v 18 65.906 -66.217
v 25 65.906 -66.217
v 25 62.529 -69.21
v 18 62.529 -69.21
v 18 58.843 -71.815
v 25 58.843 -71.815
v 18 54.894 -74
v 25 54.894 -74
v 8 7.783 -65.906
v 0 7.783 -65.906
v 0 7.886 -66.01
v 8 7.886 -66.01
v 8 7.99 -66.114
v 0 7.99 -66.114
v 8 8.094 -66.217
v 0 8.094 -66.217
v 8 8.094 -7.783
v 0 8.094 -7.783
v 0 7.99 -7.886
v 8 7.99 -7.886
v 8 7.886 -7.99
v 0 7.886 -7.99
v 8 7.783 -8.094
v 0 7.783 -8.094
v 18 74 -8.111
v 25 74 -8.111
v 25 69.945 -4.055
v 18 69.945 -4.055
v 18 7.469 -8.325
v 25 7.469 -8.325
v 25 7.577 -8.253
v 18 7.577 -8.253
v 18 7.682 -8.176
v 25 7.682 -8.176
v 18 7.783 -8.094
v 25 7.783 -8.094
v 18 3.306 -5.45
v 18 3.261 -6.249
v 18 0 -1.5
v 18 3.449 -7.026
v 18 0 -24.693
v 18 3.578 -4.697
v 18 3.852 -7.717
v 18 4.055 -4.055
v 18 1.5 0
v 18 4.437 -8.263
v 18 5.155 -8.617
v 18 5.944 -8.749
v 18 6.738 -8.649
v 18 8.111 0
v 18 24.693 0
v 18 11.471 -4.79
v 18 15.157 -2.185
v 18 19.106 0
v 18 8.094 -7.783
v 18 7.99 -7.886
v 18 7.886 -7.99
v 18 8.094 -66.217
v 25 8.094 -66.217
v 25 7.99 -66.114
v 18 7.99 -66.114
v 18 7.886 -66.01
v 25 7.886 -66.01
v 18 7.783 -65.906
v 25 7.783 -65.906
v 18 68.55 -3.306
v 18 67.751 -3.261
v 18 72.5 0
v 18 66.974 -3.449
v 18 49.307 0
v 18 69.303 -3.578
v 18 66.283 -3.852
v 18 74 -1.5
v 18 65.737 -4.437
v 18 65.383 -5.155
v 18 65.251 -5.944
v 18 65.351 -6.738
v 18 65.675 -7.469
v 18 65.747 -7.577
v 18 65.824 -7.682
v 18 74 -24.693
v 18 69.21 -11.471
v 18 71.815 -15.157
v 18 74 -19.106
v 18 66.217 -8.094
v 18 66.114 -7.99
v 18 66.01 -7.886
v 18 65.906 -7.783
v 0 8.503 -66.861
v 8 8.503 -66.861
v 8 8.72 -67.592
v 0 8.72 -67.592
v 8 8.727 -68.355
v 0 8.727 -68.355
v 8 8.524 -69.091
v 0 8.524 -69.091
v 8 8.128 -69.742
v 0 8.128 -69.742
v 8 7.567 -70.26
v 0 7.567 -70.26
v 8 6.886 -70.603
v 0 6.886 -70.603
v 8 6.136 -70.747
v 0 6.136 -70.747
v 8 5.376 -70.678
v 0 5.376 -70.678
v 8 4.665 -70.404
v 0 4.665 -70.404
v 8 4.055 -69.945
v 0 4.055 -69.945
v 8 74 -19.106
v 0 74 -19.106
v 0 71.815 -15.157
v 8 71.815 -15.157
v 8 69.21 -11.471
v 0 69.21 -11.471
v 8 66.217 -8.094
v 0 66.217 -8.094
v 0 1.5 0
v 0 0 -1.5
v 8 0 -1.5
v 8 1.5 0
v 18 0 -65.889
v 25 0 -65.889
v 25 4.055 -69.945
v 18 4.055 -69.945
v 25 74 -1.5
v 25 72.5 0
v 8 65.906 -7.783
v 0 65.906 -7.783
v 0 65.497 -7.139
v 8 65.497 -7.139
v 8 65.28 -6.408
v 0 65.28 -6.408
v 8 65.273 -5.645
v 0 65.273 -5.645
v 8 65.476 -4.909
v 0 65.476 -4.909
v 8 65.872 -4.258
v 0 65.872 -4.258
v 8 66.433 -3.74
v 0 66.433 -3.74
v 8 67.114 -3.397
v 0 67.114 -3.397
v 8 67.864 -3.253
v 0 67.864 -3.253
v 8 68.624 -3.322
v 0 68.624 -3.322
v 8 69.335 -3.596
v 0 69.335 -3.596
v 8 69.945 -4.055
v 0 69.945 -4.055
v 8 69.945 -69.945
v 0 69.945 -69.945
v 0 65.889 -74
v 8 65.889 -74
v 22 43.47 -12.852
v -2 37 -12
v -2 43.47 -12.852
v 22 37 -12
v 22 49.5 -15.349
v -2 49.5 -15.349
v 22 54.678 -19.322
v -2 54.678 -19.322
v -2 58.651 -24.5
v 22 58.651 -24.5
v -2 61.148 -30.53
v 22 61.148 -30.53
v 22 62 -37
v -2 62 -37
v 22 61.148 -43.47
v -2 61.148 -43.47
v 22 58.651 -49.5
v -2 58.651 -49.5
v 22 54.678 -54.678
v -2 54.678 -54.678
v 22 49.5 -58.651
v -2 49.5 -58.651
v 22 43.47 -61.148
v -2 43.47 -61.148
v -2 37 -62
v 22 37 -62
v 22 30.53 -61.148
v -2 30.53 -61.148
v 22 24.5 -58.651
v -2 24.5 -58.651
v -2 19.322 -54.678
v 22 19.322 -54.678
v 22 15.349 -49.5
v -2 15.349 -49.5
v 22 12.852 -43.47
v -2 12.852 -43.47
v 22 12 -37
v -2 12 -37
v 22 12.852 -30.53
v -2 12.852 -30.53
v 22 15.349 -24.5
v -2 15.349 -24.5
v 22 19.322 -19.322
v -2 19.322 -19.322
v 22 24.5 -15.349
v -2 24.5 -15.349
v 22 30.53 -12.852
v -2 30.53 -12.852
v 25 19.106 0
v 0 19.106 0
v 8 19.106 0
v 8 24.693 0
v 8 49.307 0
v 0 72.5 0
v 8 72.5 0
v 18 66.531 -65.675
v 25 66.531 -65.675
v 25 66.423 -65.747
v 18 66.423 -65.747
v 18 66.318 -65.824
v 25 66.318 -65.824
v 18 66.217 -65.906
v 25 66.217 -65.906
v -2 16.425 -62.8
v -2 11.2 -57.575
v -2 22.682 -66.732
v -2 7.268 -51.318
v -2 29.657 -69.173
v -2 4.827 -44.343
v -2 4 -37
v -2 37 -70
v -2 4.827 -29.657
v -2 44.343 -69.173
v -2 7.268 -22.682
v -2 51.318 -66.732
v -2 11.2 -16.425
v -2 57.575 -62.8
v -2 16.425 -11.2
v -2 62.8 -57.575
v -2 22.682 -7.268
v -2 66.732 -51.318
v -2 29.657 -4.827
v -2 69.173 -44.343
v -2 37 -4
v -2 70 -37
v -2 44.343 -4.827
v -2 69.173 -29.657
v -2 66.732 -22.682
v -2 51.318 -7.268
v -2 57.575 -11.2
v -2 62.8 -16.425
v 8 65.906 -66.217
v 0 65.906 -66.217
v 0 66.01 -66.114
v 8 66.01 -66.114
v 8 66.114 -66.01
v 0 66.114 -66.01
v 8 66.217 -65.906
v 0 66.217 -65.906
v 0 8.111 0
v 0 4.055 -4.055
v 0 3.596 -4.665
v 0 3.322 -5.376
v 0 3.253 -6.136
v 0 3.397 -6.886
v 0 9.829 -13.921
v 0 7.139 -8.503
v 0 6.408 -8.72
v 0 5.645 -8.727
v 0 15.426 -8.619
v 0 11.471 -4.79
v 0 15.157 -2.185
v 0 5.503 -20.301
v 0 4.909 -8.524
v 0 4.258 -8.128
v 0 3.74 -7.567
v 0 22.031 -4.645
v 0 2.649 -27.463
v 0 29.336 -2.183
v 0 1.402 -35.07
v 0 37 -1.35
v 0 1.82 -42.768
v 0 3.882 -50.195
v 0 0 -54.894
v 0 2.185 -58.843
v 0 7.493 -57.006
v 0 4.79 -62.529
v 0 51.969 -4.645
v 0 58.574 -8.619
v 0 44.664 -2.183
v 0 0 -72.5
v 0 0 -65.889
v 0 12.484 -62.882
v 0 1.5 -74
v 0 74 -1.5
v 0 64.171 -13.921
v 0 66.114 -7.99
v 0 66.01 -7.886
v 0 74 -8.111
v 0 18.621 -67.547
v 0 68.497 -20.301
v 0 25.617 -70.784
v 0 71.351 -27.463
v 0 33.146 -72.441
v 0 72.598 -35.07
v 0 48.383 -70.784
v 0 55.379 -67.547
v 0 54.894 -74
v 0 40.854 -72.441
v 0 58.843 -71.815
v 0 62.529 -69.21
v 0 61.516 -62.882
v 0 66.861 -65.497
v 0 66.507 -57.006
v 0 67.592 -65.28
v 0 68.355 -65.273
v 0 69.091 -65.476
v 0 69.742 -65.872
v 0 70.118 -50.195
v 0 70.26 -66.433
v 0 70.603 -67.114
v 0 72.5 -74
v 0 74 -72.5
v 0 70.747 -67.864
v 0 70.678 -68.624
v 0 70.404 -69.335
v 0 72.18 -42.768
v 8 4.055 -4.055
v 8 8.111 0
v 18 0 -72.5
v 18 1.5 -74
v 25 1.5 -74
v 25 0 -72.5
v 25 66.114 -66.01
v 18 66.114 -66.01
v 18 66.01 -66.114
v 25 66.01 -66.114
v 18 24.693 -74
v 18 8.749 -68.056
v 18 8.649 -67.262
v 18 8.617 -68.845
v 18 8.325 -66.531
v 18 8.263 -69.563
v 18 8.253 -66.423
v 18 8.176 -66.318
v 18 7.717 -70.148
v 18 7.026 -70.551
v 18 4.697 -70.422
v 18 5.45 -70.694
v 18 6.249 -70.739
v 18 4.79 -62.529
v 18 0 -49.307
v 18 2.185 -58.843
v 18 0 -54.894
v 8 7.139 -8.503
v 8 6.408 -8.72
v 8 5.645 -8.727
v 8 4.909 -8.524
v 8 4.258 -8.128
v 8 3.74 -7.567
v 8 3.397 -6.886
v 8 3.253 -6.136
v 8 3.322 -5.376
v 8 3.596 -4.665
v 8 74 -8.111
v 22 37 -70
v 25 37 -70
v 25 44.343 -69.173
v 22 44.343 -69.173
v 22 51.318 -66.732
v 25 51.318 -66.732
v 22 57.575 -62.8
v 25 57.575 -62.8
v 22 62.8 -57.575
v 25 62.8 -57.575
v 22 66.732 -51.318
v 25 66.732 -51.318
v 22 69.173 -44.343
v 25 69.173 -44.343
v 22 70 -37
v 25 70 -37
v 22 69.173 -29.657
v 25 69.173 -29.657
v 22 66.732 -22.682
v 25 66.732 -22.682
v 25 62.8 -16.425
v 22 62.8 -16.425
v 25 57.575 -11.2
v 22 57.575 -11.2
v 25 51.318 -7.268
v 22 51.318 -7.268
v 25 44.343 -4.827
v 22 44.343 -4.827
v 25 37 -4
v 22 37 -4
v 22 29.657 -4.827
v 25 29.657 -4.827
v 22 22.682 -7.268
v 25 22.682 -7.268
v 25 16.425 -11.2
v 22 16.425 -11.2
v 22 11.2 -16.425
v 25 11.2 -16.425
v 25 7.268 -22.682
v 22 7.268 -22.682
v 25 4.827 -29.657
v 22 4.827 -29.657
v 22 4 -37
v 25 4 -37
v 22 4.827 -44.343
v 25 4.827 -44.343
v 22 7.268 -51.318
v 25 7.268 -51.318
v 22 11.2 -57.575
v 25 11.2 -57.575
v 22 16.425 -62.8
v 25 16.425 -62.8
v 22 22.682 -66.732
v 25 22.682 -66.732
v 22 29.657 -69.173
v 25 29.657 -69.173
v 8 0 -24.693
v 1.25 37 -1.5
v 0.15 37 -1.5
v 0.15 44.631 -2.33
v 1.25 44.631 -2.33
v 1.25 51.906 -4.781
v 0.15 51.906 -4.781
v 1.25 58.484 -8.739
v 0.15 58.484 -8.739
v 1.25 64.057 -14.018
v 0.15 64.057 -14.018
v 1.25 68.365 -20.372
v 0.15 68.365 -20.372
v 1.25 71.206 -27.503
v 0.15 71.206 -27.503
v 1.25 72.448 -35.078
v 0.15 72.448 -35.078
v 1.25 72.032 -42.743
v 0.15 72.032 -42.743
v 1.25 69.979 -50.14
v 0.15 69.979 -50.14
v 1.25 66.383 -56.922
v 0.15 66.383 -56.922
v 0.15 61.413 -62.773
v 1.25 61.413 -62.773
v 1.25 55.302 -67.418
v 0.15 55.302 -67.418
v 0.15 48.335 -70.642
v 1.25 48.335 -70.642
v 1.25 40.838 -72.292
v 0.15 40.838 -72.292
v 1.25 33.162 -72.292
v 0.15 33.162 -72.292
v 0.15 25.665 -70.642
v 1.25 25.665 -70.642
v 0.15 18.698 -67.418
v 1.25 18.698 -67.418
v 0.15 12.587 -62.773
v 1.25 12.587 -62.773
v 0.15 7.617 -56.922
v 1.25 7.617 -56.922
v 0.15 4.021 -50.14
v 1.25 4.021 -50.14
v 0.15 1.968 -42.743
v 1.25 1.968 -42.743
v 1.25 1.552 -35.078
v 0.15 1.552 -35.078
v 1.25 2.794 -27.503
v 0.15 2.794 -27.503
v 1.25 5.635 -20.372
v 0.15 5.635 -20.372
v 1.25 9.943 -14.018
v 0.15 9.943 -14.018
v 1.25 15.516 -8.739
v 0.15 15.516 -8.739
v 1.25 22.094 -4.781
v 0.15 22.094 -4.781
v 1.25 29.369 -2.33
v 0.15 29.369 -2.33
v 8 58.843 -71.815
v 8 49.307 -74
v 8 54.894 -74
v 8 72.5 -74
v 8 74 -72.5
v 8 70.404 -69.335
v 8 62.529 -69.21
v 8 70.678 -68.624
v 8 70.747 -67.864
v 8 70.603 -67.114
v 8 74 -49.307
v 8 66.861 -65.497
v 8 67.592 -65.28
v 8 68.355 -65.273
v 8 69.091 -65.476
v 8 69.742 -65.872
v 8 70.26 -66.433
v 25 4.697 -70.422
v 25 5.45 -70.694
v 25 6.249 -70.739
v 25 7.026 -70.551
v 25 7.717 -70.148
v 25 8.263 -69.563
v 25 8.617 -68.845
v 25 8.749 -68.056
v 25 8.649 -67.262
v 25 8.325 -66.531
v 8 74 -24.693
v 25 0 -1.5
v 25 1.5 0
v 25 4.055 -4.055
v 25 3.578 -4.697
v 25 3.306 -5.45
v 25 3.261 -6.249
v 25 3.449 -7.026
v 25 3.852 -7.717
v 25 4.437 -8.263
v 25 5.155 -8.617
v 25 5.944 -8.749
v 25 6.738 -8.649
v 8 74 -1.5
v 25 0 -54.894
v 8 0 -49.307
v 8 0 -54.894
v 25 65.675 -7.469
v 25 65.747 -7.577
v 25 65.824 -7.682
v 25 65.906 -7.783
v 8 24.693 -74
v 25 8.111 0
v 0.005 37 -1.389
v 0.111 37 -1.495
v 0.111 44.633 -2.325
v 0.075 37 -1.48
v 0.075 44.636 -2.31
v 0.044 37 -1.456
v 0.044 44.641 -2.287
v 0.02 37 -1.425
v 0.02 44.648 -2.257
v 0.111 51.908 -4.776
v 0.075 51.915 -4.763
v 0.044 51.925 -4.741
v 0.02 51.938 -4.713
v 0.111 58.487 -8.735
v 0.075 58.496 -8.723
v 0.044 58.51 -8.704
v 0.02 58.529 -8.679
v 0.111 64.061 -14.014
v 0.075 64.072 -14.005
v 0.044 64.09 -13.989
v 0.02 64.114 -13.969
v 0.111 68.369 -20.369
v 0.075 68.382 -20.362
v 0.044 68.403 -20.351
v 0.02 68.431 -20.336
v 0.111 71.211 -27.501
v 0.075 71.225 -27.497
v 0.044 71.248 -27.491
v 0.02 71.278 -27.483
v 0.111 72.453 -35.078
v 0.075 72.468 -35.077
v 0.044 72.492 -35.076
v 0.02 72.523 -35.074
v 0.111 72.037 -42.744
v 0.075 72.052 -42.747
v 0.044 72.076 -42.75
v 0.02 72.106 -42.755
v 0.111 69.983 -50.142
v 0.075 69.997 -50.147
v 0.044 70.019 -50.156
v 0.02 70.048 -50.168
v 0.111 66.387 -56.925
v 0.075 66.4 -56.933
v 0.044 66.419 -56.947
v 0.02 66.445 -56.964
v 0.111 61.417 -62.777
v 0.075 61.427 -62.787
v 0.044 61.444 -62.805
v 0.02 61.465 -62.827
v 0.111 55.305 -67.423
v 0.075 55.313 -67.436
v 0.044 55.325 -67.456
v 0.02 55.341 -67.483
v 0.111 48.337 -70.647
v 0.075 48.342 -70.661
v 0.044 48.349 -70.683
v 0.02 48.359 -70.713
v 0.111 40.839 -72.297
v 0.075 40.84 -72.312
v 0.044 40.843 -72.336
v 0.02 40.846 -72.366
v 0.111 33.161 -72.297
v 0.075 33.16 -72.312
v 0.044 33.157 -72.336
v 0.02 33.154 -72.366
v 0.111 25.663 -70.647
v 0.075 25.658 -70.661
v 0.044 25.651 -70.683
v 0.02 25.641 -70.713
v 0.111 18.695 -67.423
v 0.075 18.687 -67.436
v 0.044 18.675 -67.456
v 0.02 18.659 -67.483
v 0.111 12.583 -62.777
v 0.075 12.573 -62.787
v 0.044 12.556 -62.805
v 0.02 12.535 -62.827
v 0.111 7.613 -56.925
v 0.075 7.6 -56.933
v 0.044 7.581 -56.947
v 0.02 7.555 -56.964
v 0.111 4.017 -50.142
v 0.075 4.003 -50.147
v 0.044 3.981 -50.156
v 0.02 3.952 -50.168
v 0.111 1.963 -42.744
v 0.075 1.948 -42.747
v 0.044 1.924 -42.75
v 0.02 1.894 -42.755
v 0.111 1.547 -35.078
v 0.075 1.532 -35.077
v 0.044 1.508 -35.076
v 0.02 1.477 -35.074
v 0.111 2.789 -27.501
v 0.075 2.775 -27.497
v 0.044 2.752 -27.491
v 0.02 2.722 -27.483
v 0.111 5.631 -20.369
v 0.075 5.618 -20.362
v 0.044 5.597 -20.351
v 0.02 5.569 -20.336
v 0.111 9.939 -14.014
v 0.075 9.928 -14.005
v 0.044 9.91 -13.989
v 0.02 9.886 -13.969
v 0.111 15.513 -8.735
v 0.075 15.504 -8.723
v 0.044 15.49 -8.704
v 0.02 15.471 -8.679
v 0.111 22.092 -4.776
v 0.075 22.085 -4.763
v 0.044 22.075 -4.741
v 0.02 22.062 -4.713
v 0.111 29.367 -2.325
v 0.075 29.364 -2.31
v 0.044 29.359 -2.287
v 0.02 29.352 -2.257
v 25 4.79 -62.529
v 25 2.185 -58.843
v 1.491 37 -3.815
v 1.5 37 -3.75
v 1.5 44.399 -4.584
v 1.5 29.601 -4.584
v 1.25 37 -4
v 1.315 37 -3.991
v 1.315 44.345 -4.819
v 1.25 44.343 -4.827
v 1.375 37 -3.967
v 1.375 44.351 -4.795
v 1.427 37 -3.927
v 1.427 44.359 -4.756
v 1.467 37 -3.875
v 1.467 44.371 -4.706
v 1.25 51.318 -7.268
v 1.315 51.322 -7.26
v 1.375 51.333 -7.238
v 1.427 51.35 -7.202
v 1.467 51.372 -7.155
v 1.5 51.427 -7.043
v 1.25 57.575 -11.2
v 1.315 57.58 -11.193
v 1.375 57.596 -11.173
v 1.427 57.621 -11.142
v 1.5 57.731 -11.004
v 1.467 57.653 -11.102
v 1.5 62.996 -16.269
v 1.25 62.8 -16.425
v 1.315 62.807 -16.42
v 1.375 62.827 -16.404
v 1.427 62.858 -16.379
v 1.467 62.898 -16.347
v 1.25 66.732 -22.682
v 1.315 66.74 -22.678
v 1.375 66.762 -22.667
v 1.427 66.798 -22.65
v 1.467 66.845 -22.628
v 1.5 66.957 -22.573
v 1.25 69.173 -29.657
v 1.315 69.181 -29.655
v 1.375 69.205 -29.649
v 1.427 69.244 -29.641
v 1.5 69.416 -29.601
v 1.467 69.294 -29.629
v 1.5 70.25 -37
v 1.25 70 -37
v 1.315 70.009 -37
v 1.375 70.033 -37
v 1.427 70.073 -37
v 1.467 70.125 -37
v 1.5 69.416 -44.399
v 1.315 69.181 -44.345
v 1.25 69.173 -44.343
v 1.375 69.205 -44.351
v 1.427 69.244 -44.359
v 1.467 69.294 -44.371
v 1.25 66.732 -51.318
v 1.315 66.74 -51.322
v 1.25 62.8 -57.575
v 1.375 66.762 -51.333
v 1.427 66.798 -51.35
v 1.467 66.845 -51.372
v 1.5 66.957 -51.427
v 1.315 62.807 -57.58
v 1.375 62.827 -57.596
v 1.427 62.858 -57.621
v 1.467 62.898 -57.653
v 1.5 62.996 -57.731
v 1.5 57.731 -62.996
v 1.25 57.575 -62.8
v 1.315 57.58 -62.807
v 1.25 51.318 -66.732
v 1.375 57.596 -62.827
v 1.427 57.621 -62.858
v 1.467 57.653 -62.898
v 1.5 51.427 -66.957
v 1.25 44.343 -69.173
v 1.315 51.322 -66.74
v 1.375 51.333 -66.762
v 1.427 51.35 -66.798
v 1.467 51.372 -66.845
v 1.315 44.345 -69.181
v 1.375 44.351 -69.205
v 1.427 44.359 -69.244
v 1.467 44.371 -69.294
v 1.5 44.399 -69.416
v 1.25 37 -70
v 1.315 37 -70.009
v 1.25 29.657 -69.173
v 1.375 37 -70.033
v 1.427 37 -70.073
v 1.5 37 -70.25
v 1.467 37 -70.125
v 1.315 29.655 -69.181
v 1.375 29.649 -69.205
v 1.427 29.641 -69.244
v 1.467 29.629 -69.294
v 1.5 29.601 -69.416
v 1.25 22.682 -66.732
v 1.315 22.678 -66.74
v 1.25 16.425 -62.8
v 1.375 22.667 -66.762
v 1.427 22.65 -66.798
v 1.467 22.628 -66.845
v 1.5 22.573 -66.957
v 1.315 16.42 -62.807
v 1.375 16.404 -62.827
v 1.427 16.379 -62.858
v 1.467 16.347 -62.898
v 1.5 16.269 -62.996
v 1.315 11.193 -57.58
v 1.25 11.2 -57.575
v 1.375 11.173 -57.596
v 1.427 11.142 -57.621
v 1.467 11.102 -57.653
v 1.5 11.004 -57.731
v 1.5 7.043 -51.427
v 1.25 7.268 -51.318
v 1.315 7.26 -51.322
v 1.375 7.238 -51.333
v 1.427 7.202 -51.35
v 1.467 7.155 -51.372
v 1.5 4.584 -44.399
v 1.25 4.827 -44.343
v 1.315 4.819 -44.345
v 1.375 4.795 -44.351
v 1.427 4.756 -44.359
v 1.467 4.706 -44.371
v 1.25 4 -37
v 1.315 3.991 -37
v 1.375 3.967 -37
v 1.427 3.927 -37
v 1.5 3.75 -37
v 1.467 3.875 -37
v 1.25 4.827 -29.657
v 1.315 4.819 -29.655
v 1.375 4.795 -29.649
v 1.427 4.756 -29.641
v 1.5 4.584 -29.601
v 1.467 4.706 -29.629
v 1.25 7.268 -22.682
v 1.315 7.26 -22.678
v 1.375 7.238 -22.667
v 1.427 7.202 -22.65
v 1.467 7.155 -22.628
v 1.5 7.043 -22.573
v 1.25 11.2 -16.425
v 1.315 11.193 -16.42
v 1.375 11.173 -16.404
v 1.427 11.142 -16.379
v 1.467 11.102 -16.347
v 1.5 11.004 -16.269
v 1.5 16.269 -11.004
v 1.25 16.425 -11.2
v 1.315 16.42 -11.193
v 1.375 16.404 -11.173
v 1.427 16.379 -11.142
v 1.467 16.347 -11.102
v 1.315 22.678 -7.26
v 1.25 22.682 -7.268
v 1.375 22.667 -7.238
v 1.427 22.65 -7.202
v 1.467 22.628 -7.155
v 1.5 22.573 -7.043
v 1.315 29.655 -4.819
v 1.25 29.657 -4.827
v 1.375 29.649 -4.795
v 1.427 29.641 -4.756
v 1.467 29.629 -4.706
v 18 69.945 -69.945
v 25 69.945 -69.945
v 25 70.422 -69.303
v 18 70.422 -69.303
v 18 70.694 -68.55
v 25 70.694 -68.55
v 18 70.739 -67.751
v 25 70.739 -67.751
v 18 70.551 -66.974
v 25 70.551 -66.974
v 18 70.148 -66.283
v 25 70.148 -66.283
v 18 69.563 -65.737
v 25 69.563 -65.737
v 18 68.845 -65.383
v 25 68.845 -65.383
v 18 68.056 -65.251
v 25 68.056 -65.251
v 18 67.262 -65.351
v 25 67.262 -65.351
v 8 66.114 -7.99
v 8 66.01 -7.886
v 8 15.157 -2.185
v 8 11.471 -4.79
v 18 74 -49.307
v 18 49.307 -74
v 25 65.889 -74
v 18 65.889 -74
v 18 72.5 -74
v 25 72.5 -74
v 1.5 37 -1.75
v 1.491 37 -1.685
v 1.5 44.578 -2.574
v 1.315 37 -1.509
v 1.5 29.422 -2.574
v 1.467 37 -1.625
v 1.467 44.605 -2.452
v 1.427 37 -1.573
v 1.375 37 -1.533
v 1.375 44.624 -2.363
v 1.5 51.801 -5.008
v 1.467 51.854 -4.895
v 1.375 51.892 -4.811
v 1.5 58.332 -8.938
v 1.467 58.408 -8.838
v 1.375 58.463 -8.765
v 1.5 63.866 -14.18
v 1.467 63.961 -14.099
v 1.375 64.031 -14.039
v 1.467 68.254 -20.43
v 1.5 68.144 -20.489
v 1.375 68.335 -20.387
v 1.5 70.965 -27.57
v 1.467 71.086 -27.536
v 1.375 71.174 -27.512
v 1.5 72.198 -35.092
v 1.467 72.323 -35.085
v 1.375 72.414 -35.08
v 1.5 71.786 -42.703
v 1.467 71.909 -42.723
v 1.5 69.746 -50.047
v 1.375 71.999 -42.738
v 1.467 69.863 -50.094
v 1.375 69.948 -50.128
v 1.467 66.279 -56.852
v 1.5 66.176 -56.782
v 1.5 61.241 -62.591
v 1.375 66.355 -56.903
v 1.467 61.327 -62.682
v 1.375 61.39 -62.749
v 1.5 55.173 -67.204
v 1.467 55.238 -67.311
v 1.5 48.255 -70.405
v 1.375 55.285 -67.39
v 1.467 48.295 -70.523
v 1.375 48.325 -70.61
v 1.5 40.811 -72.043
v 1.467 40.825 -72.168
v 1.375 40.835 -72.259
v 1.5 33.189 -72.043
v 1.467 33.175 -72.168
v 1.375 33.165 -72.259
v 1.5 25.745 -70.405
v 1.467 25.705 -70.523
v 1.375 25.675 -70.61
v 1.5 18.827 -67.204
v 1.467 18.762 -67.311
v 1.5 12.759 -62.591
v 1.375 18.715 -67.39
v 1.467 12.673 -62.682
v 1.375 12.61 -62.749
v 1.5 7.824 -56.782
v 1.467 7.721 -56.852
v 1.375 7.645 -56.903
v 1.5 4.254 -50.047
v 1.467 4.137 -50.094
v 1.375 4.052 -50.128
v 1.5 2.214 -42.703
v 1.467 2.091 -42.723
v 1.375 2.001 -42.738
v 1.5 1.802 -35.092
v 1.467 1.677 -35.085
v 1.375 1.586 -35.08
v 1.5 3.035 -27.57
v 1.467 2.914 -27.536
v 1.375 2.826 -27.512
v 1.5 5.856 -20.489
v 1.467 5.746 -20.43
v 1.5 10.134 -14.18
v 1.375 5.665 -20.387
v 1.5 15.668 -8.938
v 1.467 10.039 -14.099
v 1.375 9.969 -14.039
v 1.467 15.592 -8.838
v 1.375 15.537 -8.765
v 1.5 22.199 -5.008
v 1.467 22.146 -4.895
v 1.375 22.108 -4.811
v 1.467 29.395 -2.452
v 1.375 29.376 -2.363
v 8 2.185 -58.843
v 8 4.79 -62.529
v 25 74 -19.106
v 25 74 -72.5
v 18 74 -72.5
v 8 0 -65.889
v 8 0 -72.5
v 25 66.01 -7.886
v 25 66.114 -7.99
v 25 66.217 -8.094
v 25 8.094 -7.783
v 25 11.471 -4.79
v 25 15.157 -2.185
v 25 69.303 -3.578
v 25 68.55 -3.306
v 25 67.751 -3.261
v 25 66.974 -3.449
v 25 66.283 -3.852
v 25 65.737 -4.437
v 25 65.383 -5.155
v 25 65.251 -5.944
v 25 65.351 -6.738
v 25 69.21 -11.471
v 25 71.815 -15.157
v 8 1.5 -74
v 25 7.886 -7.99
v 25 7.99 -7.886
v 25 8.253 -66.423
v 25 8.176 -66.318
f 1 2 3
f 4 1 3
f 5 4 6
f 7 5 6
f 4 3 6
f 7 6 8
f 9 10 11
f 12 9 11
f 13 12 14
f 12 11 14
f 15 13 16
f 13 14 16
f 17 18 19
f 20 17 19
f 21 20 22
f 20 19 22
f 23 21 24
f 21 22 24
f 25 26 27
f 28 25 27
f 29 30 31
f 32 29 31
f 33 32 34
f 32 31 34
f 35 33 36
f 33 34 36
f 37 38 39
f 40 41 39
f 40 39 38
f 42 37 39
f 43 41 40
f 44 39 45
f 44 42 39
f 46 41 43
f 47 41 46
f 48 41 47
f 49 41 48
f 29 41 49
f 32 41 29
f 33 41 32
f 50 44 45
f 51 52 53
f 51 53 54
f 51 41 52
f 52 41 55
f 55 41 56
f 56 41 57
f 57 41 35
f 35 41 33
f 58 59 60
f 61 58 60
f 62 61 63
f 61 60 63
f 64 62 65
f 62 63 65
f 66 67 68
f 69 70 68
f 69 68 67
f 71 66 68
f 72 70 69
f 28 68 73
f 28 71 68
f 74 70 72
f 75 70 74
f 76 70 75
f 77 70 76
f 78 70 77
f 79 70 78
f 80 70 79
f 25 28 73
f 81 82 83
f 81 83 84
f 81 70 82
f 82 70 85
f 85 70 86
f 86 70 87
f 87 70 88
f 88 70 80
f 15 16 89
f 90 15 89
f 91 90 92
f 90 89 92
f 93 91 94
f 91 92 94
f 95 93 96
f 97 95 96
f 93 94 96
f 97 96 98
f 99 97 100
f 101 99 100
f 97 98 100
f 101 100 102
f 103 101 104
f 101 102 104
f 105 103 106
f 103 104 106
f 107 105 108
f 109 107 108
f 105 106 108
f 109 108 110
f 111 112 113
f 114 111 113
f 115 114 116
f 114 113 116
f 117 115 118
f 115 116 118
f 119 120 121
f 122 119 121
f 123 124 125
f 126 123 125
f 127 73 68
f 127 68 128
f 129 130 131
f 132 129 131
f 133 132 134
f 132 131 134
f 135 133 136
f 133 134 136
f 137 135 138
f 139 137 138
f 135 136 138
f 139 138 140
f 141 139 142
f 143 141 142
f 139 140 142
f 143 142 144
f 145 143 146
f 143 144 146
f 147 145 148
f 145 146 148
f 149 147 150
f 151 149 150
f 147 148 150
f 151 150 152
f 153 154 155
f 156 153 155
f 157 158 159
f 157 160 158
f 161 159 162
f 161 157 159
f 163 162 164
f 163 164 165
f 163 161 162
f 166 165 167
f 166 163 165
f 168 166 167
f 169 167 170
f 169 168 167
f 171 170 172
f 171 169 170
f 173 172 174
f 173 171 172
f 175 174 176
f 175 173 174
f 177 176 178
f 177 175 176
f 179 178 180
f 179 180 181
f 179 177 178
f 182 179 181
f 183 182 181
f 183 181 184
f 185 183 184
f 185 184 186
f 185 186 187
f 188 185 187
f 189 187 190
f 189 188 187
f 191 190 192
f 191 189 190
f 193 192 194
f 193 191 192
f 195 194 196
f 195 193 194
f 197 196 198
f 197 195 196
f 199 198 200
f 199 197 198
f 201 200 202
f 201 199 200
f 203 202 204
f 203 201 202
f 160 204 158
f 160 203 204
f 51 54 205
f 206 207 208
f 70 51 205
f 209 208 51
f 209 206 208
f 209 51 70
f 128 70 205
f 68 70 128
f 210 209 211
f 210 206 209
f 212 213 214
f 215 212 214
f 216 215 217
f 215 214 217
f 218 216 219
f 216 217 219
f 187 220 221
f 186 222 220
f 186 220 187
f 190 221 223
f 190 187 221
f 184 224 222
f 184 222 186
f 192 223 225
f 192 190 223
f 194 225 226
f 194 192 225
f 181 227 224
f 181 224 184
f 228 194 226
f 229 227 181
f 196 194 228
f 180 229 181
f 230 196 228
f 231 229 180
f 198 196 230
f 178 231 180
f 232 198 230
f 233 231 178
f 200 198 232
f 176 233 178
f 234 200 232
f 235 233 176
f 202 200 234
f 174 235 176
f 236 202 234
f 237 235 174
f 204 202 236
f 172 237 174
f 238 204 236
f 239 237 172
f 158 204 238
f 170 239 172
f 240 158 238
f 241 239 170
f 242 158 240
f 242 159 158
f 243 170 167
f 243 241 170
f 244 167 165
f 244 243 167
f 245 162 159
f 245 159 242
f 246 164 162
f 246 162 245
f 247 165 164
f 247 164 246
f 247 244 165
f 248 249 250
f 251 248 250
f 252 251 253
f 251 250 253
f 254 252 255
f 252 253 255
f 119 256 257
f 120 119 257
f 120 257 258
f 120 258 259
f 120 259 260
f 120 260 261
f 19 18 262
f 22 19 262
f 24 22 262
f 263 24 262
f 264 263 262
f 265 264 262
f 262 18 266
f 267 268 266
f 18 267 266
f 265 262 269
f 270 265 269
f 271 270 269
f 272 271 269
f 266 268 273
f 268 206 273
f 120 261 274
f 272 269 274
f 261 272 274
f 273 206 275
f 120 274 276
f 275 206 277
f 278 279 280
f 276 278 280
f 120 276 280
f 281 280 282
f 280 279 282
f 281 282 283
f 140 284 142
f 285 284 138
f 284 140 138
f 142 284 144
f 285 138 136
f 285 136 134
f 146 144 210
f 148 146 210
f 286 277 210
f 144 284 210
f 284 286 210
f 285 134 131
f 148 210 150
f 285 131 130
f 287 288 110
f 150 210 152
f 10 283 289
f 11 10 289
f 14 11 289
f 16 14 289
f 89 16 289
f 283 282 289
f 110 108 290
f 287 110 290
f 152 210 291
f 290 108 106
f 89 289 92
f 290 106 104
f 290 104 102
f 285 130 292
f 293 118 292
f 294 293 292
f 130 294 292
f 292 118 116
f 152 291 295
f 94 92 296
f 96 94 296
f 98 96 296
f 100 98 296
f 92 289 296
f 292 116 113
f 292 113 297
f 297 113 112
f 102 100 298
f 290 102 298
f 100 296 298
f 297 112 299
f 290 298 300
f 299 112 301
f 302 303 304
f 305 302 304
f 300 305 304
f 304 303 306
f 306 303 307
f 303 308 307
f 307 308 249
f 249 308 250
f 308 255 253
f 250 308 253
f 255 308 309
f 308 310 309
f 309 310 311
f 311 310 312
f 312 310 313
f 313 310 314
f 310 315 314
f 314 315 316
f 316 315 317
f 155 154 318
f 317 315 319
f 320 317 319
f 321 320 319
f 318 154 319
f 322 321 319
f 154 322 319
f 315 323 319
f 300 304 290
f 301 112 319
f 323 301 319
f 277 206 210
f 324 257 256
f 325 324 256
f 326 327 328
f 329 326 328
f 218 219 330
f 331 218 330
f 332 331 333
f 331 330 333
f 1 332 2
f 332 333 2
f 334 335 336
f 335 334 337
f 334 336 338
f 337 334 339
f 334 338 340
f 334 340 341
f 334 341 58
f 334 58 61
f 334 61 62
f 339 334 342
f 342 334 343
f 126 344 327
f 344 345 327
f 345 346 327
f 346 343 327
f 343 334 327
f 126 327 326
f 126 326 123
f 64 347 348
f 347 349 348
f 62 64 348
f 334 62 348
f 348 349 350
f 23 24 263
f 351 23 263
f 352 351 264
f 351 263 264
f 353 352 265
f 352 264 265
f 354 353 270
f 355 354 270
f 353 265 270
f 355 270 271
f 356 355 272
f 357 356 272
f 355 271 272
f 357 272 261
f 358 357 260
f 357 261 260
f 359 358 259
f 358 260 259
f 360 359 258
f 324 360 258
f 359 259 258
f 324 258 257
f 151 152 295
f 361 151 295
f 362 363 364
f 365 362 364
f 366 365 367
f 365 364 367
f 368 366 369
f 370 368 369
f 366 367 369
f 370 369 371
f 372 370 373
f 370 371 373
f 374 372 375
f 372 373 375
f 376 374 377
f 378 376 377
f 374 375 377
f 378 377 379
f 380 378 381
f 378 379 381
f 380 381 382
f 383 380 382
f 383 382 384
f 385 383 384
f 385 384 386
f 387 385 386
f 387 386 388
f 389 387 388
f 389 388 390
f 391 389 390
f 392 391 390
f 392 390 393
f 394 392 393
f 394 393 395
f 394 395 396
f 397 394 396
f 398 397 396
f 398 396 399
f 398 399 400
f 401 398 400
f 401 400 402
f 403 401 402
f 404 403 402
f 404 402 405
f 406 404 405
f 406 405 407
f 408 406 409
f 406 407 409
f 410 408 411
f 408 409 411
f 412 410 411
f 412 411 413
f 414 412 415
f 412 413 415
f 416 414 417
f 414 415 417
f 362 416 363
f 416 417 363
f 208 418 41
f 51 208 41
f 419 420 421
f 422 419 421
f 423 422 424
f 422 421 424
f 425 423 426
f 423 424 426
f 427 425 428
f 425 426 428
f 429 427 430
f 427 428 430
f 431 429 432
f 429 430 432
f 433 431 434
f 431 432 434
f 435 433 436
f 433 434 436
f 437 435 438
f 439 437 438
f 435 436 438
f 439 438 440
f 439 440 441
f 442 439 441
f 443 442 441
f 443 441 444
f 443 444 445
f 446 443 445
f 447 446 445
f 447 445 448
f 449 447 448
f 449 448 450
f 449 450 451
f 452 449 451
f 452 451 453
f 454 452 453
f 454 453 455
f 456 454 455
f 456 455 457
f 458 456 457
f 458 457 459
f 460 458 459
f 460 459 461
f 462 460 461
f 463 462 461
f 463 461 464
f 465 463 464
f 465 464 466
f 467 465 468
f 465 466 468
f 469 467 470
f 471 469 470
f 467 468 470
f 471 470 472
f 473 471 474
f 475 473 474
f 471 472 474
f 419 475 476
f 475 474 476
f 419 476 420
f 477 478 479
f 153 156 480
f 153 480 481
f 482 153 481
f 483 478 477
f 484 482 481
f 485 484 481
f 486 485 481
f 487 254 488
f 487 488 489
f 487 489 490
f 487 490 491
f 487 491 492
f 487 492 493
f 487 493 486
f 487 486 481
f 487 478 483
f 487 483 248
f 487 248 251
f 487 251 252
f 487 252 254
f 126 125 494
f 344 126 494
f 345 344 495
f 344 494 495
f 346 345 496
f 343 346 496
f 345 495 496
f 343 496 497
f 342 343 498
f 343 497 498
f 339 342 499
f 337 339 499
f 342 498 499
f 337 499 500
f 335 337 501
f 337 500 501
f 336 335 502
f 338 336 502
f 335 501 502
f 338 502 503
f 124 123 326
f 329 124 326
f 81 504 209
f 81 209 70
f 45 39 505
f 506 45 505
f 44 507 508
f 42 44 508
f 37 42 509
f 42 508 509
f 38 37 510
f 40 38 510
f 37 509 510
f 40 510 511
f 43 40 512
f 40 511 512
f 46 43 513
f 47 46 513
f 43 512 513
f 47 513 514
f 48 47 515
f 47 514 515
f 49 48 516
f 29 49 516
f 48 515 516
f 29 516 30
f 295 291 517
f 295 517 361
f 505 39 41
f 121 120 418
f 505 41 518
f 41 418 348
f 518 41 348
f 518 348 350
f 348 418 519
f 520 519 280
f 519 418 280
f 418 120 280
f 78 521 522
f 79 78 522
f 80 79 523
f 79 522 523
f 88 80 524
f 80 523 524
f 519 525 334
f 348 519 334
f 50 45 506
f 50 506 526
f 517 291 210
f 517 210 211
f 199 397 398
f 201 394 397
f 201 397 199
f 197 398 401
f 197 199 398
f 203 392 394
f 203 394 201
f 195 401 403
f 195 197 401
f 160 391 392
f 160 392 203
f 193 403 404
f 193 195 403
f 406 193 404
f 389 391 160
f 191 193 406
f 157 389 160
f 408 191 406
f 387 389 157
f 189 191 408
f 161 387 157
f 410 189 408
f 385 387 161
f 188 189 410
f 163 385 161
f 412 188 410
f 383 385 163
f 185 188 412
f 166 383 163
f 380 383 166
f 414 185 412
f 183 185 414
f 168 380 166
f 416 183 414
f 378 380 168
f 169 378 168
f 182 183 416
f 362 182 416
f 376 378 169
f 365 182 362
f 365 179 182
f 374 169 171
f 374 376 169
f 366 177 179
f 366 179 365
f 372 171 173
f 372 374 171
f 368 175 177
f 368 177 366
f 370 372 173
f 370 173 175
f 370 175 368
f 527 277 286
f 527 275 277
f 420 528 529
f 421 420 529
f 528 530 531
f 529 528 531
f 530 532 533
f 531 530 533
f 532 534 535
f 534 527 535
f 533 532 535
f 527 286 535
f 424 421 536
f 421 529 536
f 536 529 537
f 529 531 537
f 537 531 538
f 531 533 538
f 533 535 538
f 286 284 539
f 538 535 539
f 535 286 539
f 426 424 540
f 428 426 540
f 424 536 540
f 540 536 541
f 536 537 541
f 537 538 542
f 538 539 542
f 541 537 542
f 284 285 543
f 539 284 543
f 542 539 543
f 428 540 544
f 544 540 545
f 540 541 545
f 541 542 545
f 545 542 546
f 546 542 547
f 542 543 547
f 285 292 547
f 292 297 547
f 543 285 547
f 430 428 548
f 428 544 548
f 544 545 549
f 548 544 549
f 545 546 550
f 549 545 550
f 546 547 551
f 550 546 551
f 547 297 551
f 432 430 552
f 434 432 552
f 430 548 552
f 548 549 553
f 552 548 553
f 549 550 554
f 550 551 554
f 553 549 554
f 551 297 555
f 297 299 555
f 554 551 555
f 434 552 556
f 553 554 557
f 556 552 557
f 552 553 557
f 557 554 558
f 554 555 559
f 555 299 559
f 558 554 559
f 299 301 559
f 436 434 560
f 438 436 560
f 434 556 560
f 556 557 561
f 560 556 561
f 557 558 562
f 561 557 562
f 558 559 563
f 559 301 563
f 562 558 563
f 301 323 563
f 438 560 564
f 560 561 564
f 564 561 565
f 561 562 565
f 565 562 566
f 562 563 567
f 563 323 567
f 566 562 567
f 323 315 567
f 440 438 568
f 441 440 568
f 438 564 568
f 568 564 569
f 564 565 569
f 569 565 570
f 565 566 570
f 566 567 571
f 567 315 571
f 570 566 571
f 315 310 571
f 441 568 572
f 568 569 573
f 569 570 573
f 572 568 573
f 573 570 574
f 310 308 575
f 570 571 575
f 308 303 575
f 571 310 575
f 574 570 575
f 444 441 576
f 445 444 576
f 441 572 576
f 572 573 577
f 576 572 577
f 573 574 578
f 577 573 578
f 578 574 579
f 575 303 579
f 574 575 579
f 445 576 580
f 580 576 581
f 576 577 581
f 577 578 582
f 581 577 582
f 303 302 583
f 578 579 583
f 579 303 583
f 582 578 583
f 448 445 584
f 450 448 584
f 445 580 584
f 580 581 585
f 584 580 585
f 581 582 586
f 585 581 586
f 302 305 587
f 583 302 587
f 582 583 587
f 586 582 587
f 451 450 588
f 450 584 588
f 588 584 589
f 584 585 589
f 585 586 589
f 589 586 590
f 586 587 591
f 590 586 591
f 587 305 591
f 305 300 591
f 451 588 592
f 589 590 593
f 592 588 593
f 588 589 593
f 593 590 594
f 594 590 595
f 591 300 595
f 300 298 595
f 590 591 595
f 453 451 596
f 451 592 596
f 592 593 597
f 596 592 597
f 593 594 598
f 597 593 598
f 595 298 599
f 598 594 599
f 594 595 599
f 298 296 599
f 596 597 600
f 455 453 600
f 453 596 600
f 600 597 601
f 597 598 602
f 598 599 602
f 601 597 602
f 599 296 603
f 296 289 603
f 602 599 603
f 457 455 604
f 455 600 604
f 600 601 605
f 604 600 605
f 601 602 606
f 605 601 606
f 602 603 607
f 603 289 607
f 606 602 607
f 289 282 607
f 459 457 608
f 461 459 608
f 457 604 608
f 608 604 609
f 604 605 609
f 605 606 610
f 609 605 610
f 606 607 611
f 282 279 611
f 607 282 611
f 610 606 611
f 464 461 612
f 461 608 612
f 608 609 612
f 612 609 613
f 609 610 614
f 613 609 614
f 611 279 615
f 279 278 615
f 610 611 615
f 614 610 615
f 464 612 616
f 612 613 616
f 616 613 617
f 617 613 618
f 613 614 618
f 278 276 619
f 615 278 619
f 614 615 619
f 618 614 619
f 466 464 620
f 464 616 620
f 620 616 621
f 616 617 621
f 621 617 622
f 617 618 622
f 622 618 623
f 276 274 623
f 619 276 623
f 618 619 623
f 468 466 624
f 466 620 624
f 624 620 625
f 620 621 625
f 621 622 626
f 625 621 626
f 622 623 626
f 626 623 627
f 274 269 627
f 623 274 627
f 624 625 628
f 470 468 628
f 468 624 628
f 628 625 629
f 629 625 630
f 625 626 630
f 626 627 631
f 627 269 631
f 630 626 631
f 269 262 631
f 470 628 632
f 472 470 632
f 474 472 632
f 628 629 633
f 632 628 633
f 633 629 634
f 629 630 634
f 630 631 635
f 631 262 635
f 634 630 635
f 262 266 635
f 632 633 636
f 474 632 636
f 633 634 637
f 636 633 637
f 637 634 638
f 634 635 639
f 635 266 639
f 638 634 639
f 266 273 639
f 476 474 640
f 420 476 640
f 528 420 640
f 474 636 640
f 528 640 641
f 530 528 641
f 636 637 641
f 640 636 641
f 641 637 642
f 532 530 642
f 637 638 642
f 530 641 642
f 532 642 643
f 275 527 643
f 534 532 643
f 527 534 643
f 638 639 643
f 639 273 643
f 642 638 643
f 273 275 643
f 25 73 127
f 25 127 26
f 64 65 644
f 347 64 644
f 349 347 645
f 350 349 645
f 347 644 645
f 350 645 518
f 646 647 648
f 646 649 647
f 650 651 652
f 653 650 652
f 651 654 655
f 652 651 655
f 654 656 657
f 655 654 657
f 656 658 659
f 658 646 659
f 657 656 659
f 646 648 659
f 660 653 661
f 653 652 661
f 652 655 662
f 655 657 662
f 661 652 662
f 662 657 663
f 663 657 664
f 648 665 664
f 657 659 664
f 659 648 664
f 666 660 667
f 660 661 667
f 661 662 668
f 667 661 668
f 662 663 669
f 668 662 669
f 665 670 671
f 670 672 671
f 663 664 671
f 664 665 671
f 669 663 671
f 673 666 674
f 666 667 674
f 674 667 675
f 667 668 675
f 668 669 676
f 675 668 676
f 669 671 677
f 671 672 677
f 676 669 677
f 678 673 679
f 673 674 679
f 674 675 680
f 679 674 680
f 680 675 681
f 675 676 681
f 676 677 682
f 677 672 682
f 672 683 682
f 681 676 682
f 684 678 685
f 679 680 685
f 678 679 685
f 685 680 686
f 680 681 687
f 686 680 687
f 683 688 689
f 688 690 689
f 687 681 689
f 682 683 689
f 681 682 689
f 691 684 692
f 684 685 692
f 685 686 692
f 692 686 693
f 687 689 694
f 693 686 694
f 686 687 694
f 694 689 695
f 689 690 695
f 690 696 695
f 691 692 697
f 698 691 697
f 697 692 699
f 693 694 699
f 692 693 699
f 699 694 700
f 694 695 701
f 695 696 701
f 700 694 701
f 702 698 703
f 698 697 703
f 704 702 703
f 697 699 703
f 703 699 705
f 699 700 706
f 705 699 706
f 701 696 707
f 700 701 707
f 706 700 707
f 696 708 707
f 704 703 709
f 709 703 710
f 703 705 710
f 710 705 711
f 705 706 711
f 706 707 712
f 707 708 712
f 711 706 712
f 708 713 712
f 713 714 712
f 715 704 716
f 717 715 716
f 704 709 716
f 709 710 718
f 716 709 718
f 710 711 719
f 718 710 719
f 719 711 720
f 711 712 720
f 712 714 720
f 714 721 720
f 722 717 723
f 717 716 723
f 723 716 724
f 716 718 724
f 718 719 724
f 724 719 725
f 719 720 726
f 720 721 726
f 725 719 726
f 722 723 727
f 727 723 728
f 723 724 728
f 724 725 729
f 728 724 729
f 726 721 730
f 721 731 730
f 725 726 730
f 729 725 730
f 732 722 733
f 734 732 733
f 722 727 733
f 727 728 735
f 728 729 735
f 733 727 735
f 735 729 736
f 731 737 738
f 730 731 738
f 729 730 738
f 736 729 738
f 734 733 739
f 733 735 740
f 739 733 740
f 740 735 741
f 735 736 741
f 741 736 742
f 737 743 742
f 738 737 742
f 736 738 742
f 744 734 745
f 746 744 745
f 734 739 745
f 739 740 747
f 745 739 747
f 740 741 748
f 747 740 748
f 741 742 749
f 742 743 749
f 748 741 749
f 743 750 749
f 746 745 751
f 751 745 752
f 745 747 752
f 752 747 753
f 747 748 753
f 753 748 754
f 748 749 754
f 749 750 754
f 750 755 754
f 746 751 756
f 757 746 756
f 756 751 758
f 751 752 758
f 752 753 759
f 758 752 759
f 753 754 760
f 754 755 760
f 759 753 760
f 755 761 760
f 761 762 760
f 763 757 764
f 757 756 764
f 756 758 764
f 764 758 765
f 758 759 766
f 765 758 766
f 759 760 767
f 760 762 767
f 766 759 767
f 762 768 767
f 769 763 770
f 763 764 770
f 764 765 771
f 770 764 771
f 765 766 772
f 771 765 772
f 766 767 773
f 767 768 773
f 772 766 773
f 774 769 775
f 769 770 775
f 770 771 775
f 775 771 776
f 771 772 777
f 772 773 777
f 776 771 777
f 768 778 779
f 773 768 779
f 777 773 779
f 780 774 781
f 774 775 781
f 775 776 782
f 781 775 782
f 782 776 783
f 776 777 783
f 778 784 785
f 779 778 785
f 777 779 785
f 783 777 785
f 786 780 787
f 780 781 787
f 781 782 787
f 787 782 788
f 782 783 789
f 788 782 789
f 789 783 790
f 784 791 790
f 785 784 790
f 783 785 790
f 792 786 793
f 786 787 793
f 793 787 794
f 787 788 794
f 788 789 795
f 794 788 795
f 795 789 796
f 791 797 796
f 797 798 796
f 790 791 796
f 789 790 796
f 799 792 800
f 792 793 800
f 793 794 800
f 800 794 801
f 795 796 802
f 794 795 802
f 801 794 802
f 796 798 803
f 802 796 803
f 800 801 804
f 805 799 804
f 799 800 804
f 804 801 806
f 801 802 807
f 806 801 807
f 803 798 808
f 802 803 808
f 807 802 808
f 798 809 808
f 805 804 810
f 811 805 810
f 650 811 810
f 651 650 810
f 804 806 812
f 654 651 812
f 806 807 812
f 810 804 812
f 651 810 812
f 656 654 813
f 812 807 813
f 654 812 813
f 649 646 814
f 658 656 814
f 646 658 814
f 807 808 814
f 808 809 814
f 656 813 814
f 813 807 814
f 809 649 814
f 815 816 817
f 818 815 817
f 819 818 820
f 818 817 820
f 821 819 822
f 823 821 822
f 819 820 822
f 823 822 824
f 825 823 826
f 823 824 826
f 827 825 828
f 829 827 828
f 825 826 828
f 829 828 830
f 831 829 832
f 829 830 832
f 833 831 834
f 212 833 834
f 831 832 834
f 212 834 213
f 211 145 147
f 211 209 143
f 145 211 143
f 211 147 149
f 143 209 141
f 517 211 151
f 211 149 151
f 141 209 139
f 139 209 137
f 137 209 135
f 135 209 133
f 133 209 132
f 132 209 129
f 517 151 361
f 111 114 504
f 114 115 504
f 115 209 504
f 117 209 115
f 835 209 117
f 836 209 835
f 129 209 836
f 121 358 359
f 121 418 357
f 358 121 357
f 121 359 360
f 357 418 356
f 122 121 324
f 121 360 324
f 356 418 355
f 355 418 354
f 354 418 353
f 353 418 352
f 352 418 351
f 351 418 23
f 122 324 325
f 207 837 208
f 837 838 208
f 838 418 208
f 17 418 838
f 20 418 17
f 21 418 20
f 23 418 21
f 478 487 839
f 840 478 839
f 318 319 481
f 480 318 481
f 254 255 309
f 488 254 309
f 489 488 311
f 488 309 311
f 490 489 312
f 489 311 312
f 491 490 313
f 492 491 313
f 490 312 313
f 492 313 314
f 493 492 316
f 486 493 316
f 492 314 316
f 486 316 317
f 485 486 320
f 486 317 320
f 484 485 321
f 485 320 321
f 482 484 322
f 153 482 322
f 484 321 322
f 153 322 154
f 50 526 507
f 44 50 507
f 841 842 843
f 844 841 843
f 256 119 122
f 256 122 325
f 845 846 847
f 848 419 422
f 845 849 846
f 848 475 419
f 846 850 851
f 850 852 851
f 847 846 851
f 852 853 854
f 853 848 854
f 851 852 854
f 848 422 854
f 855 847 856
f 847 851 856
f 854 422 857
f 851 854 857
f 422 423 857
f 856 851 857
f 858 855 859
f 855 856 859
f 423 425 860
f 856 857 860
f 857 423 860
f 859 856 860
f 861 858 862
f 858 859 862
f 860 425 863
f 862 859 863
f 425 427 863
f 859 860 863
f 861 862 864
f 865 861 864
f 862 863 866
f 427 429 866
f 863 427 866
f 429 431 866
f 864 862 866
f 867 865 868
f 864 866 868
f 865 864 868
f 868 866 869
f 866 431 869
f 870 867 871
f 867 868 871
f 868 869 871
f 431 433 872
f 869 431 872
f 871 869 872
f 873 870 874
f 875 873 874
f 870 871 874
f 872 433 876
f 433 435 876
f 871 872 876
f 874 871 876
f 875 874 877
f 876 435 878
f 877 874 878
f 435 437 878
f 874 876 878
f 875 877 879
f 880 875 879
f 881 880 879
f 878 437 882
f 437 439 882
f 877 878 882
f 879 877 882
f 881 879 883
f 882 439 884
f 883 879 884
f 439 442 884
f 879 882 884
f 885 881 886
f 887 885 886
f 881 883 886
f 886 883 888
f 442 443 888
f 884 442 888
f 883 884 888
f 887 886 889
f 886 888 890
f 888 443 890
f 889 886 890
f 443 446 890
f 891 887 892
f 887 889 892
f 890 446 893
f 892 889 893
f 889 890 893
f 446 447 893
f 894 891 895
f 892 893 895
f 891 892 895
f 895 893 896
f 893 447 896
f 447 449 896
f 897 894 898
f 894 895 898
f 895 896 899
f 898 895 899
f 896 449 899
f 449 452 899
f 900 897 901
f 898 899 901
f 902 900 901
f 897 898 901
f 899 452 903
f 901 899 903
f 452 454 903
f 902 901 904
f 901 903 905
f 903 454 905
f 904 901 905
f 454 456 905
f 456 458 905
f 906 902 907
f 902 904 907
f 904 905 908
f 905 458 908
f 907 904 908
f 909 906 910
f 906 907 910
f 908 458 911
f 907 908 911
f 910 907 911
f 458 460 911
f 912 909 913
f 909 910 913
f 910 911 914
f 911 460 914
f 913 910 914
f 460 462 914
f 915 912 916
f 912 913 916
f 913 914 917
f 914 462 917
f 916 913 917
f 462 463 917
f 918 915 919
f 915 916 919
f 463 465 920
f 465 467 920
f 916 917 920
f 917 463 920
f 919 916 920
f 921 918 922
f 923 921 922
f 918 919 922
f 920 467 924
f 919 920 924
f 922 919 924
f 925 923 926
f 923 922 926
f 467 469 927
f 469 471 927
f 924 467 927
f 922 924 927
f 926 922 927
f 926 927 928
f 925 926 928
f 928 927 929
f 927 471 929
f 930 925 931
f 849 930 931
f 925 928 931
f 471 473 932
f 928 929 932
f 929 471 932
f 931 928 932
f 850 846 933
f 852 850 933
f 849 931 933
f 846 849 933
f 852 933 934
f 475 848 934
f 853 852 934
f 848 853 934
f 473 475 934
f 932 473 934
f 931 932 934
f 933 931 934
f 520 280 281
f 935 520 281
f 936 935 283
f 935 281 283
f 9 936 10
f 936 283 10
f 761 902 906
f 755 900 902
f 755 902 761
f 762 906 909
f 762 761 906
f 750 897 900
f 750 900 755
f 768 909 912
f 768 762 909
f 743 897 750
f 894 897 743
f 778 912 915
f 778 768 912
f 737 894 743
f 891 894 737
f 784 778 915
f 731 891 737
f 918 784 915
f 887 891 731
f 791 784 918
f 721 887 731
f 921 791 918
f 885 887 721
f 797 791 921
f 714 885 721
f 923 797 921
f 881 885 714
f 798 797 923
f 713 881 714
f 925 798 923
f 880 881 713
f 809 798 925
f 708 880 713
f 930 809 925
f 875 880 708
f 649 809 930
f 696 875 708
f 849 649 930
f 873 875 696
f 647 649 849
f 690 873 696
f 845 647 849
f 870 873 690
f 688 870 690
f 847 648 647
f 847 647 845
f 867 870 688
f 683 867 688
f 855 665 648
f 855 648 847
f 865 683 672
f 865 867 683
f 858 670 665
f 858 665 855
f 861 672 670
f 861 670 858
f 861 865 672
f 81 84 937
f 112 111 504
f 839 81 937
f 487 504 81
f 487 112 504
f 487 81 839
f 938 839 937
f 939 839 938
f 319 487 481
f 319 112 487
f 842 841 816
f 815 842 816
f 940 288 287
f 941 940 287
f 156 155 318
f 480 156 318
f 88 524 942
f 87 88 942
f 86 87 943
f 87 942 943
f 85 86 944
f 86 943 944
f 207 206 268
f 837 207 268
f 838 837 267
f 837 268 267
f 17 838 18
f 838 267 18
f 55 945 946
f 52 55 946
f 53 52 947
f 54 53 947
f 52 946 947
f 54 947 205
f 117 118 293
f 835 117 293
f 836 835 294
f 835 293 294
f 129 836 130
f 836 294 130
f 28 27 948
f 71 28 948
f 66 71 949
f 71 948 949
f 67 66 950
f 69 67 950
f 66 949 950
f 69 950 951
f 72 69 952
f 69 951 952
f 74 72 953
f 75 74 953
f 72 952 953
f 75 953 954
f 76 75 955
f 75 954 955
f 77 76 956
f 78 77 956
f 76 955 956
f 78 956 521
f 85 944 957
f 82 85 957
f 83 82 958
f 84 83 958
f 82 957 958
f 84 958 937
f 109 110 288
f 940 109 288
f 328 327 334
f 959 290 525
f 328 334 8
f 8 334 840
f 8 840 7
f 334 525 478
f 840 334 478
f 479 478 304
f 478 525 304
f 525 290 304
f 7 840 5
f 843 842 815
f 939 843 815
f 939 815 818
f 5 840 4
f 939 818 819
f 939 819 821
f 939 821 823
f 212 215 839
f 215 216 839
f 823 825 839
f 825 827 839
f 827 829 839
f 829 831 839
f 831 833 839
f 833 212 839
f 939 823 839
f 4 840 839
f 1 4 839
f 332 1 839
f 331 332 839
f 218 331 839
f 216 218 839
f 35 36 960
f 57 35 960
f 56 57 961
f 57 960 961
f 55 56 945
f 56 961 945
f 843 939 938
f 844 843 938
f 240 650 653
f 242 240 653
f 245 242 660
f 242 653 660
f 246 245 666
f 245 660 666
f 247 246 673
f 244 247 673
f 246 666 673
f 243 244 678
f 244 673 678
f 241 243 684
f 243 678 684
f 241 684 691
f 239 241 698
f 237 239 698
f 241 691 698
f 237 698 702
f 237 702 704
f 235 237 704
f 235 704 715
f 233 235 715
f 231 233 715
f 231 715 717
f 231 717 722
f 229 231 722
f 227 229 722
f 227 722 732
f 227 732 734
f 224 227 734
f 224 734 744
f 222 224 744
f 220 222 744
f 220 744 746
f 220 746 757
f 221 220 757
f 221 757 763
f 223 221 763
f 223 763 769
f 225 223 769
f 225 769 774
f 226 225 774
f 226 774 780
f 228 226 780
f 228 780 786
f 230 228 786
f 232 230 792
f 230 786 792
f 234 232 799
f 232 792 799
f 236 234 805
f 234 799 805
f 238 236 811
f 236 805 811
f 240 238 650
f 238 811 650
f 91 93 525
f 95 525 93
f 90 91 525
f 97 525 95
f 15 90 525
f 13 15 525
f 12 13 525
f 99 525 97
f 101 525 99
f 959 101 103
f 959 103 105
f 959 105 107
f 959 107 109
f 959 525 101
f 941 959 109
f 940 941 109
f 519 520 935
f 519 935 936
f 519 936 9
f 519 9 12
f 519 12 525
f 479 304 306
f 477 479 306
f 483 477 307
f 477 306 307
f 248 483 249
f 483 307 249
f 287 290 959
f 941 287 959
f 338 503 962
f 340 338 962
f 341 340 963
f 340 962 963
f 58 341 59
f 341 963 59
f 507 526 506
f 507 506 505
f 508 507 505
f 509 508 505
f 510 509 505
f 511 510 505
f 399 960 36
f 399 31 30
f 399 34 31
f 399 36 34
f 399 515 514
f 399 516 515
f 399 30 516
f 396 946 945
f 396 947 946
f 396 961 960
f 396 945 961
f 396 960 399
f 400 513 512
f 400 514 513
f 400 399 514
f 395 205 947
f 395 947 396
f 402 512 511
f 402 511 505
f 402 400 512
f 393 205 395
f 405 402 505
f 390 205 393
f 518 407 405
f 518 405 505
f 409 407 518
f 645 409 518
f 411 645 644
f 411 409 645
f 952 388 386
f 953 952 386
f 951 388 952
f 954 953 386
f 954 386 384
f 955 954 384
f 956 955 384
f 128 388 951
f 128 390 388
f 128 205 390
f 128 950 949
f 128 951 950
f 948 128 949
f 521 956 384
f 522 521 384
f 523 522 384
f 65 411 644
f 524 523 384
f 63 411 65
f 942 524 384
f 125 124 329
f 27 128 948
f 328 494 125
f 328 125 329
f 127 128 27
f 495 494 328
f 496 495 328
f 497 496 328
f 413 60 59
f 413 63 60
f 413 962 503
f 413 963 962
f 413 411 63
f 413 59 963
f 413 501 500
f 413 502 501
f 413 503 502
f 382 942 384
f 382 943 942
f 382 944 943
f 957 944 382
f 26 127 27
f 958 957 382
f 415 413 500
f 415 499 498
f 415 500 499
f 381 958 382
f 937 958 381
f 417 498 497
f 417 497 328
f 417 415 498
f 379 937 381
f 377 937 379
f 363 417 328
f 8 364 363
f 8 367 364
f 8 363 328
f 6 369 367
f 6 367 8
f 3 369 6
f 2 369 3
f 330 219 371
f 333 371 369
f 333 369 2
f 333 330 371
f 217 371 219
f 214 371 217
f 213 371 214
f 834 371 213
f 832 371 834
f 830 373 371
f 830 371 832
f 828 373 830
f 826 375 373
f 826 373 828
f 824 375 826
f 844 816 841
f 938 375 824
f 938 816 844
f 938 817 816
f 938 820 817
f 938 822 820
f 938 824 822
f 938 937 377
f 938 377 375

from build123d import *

# Parameters (mm, degrees)
ESBO_O1_W                                           = 74
ESBO_O1_H                                           = 74
RESSALTO_EXTRUS_O1_DEPTH                            = 25
CHANFRO1_SIZE                                       = 1.5
REBAIXO_PARA_PARAFUSO_COM_CABE_A_PANELA_D           = 50
REBAIXO_PARA_PARAFUSO_COM_CABE_A_PANELA_DEPTH       = 35
REBAIXO_PARA_PARAFUSO_COM_CABE_A_PANELA_CBORE_D     = 66
REBAIXO_PARA_PARAFUSO_COM_CABE_A_PANELA_CBORE_DEPTH = 3
REBAIXO_PARA_PARAFUSO_COM_CABE_A_PANELA_TIP         = 15.021515476
ESBO_O4_W                                           = 10
ESBO_O4_H                                           = 50
CORTE_EXTRUS_O1_DEPTH                               = 16.4
ESBO_O6_W                                           = 10
ESBO_O6_H                                           = 50
CORTE_EXTRUS_O2_DEPTH                               = 16.4
CORTE_EXTRUS_O4_REACH                               = 19.461
ESBO_O11_W                                          = 10
ESBO_O11_H                                          = 50
CORTE_EXTRUS_O3_DEPTH                               = 7
PADR_OCIRCULAR1_COUNT                               = 4
ESBO_O13_R                                          = 33
ESBO_O13_R_2                                        = 25
RESSALTO_EXTRUS_O2_DEPTH                            = 2
ESBO_O14_R                                          = 35.5
ESBO_O14_R_2                                        = 33
CORTE_EXTRUS_O5_DEPTH                               = 3.5
CORTE_EXTRUS_O10_DEPTH                              = 8
PADR_OCIRCULAR2_COUNT                               = 4
FILETE1_R                                           = 0.25
FILETE2_R                                           = 0.15


with BuildPart() as part:
    # Esboço1 → Ressalto-extrusão1 (new body)
    with BuildSketch(Plane(origin=(0, 0, 0), x_dir=(0, 0, -1), z_dir=(1, 0, 0))):
        with Locations((37, 37)):
            Rectangle(ESBO_O1_W, ESBO_O1_H)
    extrude(amount=RESSALTO_EXTRUS_O1_DEPTH)

    # Chanfro1
    chanfro1_edges = [part.edges().sort_by_distance(p)[0] for p in [
        (12.5, 74, 0),
        (12.5, 74, -74),
        (12.5, 0, -74),
        (12.5, 0, 0),
    ]]
    chamfer(chanfro1_edges, length=CHANFRO1_SIZE)

    # Rebaixo para parafuso com cabeça panela de M21
    with Locations(Plane(origin=(25, 0, 0), x_dir=(0, 0, -1), z_dir=(1, 0, 0))):
        with Locations((37, 37)):
            CounterBoreHole(REBAIXO_PARA_PARAFUSO_COM_CABE_A_PANELA_D / 2, REBAIXO_PARA_PARAFUSO_COM_CABE_A_PANELA_CBORE_D / 2, REBAIXO_PARA_PARAFUSO_COM_CABE_A_PANELA_CBORE_DEPTH, depth=REBAIXO_PARA_PARAFUSO_COM_CABE_A_PANELA_DEPTH)
            with Locations((0, 0, -(REBAIXO_PARA_PARAFUSO_COM_CABE_A_PANELA_DEPTH + REBAIXO_PARA_PARAFUSO_COM_CABE_A_PANELA_TIP / 2))):  # 118° drill point
                Cone(0, REBAIXO_PARA_PARAFUSO_COM_CABE_A_PANELA_D / 2, REBAIXO_PARA_PARAFUSO_COM_CABE_A_PANELA_TIP, mode=Mode.SUBTRACT)

    # Esboço4 → Corte-extrusão1 (cut)
    with BuildSketch(Plane(origin=(0, 12.346551211, -12.346551211), x_dir=(1, 0, 0), z_dir=(0, -0.707106781, 0.707106781))):
        with Locations((13, 0)):
            Rectangle(ESBO_O4_W, ESBO_O4_H)
    corte_extrus_o1 = extrude(amount=CORTE_EXTRUS_O1_DEPTH, mode=Mode.SUBTRACT)

    # Espelhar1: Corte-extrusão1 across plane
    add(corte_extrus_o1.mirror(Plane(origin=(0, 37, -37), x_dir=(0, 0.707106781, 0.707106781), z_dir=(0, -0.707106781, 0.707106781))), mode=Mode.SUBTRACT)

    # Esboço6 → Corte-extrusão2 (cut)
    with BuildSketch(Plane(origin=(0, -36.25, -36.25), x_dir=(1, 0, 0), z_dir=(0, -0.707106781, -0.707106781))):
        with Locations((13, -52.325901808)):
            Rectangle(ESBO_O6_W, ESBO_O6_H)
    extrude(amount=-CORTE_EXTRUS_O2_DEPTH, mode=Mode.SUBTRACT)

    # Esboço11 → Corte-extrusão4 (cut, up to next)
    with BuildSketch(Plane(origin=(0, 24.653448789, 24.653448789), x_dir=(1, 0, 0), z_dir=(0, 0.707106781, 0.707106781)), mode=Mode.PRIVATE) as corte_extrus_o4_sk1:
        with Locations((13, 52.325901808)):
            Rectangle(ESBO_O11_W, ESBO_O11_H)
    corte_extrus_o4_tool1 = extrude(corte_extrus_o4_sk1.sketch, amount=CORTE_EXTRUS_O4_REACH, mode=Mode.PRIVATE) & part.part
    add(corte_extrus_o4_tool1.solids().sort_by_distance((13, 61.653449, -12.346551))[0], mode=Mode.SUBTRACT)

    # Esboço9 → Corte-extrusão3 (cut)
    with BuildSketch(Plane(origin=(25, 0, 0), x_dir=(0, 0, -1), z_dir=(1, 0, 0))):
        with BuildLine():
            Line((8.110912703, 74), (4.055456352, 69.944543648))
            ThreePointArc((4.055456352, 69.944543648), (3.852112704, 66.282711392), (7.468916653, 65.675180896))
            ThreePointArc((7.468916653, 65.675180896), (7.630037959, 65.785169024), (7.782956276, 65.90630305))
            ThreePointArc((7.782956276, 65.90630305), (7.937911293, 66.062088707), (8.09369695, 66.217043724))
            ThreePointArc((8.09369695, 66.217043724), (13.278272682, 70.563218753), (19.105587464, 74))
            Line((19.105587464, 74), (8.110912703, 74))
        make_face()
    corte_extrus_o3 = extrude(amount=-CORTE_EXTRUS_O3_DEPTH, mode=Mode.SUBTRACT)

    # PadrãoCircular1: Corte-extrusão3 ×4 about axis
    padr_ocircular1_axis = Axis((0, 37, -37), (1, 0, 0))
    for i in range(1, PADR_OCIRCULAR1_COUNT):
        add(corte_extrus_o3.rotate(padr_ocircular1_axis, i * 360 / PADR_OCIRCULAR1_COUNT), mode=Mode.SUBTRACT)

    # Esboço13 → Ressalto-extrusão2 (add)
    with BuildSketch(Plane.ZY):
        with Locations((-37, 37)):
            Circle(ESBO_O13_R)
        with Locations((-37, 37)):
            Circle(ESBO_O13_R_2, mode=Mode.SUBTRACT)
    extrude(amount=RESSALTO_EXTRUS_O2_DEPTH)

    # Esboço14 → Corte-extrusão5 (cut)
    with BuildSketch(Plane.ZY.offset(2)):
        with Locations((-37, 37)):
            Circle(ESBO_O14_R)
        with Locations((-37, 37)):
            Circle(ESBO_O14_R_2, mode=Mode.SUBTRACT)
    extrude(amount=-CORTE_EXTRUS_O5_DEPTH, mode=Mode.SUBTRACT)

    # Esboço16 → Corte-extrusão10 (cut)
    with BuildSketch(Plane.ZY):
        with BuildLine():
            ThreePointArc((-7.782956276, 65.90630305), (-3.979263896, 66.134758569), (-4.055456352, 69.944543648))
            Line((-4.055456352, 69.944543648), (-8.110912703, 74))
            Line((-8.110912703, 74), (-19.105587464, 74))
            ThreePointArc((-19.105587464, 74), (-13.278272682, 70.563218753), (-8.09369695, 66.217043724))
            ThreePointArc((-8.09369695, 66.217043724), (-7.937911293, 66.062088707), (-7.782956276, 65.90630305))
        make_face()
    corte_extrus_o10 = extrude(amount=-CORTE_EXTRUS_O10_DEPTH, mode=Mode.SUBTRACT)

    # PadrãoCircular2: Corte-extrusão10 ×4 about axis
    padr_ocircular2_axis = Axis((0, 37, -37), (1, 0, 0))
    for i in range(1, PADR_OCIRCULAR2_COUNT):
        add(corte_extrus_o10.rotate(padr_ocircular2_axis, i * 360 / PADR_OCIRCULAR2_COUNT), mode=Mode.SUBTRACT)

    # Filete1
    filete1_edges = [part.edges().sort_by_distance(p)[0] for p in [
        (1.5, 37, -72.5),
        (1.5, 37, -70),
    ]]
    fillet(filete1_edges, radius=FILETE1_R)

    # Filete2
    filete2_edges = [part.edges().sort_by_distance(p)[0] for p in [
        (0, 37, -72.5),
    ]]
    fillet(filete2_edges, radius=FILETE2_R)


solid = part.part
